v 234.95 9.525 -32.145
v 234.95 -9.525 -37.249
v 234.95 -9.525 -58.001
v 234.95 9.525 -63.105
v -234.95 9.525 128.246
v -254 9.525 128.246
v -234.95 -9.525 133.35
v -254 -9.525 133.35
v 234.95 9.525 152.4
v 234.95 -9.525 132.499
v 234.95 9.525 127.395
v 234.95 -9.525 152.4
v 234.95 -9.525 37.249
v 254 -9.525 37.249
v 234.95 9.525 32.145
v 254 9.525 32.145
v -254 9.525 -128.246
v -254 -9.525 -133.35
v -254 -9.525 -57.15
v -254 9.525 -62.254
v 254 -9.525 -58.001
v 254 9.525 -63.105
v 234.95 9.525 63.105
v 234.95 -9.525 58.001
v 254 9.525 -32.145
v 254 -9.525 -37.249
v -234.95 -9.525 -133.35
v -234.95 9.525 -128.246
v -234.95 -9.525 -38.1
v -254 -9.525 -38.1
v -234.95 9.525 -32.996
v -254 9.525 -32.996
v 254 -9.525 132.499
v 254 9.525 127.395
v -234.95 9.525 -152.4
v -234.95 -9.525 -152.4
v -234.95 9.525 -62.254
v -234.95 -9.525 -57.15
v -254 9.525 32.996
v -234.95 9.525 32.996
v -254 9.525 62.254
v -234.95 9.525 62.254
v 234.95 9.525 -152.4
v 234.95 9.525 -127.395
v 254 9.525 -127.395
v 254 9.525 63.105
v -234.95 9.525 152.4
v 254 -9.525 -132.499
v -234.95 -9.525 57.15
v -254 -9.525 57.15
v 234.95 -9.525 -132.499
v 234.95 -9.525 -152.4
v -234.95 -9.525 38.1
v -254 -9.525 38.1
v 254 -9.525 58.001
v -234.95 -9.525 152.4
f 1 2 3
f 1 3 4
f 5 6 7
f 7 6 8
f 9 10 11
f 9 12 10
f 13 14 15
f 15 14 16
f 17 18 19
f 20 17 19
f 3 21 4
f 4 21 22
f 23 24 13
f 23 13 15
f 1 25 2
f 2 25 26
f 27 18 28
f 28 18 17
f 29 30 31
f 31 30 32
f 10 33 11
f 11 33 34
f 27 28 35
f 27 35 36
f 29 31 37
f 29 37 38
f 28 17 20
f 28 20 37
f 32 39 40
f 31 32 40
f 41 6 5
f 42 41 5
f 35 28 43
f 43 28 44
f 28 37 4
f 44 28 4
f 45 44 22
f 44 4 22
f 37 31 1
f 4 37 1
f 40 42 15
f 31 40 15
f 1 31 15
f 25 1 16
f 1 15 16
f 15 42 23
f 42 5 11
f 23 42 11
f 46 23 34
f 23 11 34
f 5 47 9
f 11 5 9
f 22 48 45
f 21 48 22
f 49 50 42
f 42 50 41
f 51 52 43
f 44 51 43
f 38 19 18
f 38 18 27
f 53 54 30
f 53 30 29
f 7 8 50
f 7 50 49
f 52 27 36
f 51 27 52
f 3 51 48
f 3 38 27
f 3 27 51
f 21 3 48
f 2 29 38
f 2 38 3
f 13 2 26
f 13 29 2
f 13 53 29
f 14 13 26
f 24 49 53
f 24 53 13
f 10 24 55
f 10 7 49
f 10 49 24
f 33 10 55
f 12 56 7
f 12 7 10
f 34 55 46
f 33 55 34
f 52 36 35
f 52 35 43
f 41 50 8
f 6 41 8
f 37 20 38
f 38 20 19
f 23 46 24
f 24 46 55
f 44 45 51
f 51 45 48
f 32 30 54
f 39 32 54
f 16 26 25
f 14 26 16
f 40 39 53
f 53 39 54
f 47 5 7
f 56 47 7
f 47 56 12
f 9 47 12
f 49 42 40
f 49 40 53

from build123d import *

# Parameters (mm, degrees)
F0_W     = 508
F0_H     = 304.8
F1_DEPTH = 9.525
F3_DEPTH = 19.05
F5_DEPTH = 19.05


# Not quite as in the source:
# - a feature names something its author has since deleted; it is built from what else it names


with BuildPart() as f1:
    # F0 (on Front) → F1 (new body, symmetric)
    with BuildSketch(Plane.XZ):
        Rectangle(F0_W, F0_H)
    extrude(amount=F1_DEPTH, both=True)

    # F2 (on face) → F3 (cut)
    with BuildSketch(Plane(origin=(-254, 0, 0), x_dir=(0, -1, 0), z_dir=(-1, 0, 0))):
        Polygon((-9.525, 128.2455678842), (9.525, 133.35), (9.525, 152.4), (-9.525, 152.4), align=None)
        Polygon((9.525, 38.1), (9.525, 57.15), (-9.525, 62.2544321158), (-9.525, 32.9955678842), align=None)
        Polygon((9.525, -57.15), (9.525, -38.1), (-9.525, -32.9955678842), (-9.525, -62.2544321158), align=None)
        Polygon((9.525, -152.4), (9.525, -133.35), (-9.525, -128.2455678842), (-9.525, -152.4), align=None)
    extrude(amount=-F3_DEPTH, mode=Mode.SUBTRACT)

    # F4 (on face) → F5 (cut)
    with BuildSketch(Plane.YZ.offset(254)):
        Polygon((-9.525, 132.499261314), (9.525, 127.3948291982), (9.525, 152.4), (-9.525, 152.4), align=None)
        Polygon((9.525, 32.1448291982), (9.525, 63.1051708018), (-9.525, 58.000738686), (-9.525, 37.249261314), align=None)
        Polygon((9.525, -63.1051708018), (9.525, -32.1448291982), (-9.525, -37.249261314), (-9.525, -58.000738686), align=None)
        Polygon((9.525, -152.4), (9.525, -127.3948291982), (-9.525, -132.499261314), (-9.525, -152.4), align=None)
    extrude(amount=-F5_DEPTH, mode=Mode.SUBTRACT)


solid = f1.part
